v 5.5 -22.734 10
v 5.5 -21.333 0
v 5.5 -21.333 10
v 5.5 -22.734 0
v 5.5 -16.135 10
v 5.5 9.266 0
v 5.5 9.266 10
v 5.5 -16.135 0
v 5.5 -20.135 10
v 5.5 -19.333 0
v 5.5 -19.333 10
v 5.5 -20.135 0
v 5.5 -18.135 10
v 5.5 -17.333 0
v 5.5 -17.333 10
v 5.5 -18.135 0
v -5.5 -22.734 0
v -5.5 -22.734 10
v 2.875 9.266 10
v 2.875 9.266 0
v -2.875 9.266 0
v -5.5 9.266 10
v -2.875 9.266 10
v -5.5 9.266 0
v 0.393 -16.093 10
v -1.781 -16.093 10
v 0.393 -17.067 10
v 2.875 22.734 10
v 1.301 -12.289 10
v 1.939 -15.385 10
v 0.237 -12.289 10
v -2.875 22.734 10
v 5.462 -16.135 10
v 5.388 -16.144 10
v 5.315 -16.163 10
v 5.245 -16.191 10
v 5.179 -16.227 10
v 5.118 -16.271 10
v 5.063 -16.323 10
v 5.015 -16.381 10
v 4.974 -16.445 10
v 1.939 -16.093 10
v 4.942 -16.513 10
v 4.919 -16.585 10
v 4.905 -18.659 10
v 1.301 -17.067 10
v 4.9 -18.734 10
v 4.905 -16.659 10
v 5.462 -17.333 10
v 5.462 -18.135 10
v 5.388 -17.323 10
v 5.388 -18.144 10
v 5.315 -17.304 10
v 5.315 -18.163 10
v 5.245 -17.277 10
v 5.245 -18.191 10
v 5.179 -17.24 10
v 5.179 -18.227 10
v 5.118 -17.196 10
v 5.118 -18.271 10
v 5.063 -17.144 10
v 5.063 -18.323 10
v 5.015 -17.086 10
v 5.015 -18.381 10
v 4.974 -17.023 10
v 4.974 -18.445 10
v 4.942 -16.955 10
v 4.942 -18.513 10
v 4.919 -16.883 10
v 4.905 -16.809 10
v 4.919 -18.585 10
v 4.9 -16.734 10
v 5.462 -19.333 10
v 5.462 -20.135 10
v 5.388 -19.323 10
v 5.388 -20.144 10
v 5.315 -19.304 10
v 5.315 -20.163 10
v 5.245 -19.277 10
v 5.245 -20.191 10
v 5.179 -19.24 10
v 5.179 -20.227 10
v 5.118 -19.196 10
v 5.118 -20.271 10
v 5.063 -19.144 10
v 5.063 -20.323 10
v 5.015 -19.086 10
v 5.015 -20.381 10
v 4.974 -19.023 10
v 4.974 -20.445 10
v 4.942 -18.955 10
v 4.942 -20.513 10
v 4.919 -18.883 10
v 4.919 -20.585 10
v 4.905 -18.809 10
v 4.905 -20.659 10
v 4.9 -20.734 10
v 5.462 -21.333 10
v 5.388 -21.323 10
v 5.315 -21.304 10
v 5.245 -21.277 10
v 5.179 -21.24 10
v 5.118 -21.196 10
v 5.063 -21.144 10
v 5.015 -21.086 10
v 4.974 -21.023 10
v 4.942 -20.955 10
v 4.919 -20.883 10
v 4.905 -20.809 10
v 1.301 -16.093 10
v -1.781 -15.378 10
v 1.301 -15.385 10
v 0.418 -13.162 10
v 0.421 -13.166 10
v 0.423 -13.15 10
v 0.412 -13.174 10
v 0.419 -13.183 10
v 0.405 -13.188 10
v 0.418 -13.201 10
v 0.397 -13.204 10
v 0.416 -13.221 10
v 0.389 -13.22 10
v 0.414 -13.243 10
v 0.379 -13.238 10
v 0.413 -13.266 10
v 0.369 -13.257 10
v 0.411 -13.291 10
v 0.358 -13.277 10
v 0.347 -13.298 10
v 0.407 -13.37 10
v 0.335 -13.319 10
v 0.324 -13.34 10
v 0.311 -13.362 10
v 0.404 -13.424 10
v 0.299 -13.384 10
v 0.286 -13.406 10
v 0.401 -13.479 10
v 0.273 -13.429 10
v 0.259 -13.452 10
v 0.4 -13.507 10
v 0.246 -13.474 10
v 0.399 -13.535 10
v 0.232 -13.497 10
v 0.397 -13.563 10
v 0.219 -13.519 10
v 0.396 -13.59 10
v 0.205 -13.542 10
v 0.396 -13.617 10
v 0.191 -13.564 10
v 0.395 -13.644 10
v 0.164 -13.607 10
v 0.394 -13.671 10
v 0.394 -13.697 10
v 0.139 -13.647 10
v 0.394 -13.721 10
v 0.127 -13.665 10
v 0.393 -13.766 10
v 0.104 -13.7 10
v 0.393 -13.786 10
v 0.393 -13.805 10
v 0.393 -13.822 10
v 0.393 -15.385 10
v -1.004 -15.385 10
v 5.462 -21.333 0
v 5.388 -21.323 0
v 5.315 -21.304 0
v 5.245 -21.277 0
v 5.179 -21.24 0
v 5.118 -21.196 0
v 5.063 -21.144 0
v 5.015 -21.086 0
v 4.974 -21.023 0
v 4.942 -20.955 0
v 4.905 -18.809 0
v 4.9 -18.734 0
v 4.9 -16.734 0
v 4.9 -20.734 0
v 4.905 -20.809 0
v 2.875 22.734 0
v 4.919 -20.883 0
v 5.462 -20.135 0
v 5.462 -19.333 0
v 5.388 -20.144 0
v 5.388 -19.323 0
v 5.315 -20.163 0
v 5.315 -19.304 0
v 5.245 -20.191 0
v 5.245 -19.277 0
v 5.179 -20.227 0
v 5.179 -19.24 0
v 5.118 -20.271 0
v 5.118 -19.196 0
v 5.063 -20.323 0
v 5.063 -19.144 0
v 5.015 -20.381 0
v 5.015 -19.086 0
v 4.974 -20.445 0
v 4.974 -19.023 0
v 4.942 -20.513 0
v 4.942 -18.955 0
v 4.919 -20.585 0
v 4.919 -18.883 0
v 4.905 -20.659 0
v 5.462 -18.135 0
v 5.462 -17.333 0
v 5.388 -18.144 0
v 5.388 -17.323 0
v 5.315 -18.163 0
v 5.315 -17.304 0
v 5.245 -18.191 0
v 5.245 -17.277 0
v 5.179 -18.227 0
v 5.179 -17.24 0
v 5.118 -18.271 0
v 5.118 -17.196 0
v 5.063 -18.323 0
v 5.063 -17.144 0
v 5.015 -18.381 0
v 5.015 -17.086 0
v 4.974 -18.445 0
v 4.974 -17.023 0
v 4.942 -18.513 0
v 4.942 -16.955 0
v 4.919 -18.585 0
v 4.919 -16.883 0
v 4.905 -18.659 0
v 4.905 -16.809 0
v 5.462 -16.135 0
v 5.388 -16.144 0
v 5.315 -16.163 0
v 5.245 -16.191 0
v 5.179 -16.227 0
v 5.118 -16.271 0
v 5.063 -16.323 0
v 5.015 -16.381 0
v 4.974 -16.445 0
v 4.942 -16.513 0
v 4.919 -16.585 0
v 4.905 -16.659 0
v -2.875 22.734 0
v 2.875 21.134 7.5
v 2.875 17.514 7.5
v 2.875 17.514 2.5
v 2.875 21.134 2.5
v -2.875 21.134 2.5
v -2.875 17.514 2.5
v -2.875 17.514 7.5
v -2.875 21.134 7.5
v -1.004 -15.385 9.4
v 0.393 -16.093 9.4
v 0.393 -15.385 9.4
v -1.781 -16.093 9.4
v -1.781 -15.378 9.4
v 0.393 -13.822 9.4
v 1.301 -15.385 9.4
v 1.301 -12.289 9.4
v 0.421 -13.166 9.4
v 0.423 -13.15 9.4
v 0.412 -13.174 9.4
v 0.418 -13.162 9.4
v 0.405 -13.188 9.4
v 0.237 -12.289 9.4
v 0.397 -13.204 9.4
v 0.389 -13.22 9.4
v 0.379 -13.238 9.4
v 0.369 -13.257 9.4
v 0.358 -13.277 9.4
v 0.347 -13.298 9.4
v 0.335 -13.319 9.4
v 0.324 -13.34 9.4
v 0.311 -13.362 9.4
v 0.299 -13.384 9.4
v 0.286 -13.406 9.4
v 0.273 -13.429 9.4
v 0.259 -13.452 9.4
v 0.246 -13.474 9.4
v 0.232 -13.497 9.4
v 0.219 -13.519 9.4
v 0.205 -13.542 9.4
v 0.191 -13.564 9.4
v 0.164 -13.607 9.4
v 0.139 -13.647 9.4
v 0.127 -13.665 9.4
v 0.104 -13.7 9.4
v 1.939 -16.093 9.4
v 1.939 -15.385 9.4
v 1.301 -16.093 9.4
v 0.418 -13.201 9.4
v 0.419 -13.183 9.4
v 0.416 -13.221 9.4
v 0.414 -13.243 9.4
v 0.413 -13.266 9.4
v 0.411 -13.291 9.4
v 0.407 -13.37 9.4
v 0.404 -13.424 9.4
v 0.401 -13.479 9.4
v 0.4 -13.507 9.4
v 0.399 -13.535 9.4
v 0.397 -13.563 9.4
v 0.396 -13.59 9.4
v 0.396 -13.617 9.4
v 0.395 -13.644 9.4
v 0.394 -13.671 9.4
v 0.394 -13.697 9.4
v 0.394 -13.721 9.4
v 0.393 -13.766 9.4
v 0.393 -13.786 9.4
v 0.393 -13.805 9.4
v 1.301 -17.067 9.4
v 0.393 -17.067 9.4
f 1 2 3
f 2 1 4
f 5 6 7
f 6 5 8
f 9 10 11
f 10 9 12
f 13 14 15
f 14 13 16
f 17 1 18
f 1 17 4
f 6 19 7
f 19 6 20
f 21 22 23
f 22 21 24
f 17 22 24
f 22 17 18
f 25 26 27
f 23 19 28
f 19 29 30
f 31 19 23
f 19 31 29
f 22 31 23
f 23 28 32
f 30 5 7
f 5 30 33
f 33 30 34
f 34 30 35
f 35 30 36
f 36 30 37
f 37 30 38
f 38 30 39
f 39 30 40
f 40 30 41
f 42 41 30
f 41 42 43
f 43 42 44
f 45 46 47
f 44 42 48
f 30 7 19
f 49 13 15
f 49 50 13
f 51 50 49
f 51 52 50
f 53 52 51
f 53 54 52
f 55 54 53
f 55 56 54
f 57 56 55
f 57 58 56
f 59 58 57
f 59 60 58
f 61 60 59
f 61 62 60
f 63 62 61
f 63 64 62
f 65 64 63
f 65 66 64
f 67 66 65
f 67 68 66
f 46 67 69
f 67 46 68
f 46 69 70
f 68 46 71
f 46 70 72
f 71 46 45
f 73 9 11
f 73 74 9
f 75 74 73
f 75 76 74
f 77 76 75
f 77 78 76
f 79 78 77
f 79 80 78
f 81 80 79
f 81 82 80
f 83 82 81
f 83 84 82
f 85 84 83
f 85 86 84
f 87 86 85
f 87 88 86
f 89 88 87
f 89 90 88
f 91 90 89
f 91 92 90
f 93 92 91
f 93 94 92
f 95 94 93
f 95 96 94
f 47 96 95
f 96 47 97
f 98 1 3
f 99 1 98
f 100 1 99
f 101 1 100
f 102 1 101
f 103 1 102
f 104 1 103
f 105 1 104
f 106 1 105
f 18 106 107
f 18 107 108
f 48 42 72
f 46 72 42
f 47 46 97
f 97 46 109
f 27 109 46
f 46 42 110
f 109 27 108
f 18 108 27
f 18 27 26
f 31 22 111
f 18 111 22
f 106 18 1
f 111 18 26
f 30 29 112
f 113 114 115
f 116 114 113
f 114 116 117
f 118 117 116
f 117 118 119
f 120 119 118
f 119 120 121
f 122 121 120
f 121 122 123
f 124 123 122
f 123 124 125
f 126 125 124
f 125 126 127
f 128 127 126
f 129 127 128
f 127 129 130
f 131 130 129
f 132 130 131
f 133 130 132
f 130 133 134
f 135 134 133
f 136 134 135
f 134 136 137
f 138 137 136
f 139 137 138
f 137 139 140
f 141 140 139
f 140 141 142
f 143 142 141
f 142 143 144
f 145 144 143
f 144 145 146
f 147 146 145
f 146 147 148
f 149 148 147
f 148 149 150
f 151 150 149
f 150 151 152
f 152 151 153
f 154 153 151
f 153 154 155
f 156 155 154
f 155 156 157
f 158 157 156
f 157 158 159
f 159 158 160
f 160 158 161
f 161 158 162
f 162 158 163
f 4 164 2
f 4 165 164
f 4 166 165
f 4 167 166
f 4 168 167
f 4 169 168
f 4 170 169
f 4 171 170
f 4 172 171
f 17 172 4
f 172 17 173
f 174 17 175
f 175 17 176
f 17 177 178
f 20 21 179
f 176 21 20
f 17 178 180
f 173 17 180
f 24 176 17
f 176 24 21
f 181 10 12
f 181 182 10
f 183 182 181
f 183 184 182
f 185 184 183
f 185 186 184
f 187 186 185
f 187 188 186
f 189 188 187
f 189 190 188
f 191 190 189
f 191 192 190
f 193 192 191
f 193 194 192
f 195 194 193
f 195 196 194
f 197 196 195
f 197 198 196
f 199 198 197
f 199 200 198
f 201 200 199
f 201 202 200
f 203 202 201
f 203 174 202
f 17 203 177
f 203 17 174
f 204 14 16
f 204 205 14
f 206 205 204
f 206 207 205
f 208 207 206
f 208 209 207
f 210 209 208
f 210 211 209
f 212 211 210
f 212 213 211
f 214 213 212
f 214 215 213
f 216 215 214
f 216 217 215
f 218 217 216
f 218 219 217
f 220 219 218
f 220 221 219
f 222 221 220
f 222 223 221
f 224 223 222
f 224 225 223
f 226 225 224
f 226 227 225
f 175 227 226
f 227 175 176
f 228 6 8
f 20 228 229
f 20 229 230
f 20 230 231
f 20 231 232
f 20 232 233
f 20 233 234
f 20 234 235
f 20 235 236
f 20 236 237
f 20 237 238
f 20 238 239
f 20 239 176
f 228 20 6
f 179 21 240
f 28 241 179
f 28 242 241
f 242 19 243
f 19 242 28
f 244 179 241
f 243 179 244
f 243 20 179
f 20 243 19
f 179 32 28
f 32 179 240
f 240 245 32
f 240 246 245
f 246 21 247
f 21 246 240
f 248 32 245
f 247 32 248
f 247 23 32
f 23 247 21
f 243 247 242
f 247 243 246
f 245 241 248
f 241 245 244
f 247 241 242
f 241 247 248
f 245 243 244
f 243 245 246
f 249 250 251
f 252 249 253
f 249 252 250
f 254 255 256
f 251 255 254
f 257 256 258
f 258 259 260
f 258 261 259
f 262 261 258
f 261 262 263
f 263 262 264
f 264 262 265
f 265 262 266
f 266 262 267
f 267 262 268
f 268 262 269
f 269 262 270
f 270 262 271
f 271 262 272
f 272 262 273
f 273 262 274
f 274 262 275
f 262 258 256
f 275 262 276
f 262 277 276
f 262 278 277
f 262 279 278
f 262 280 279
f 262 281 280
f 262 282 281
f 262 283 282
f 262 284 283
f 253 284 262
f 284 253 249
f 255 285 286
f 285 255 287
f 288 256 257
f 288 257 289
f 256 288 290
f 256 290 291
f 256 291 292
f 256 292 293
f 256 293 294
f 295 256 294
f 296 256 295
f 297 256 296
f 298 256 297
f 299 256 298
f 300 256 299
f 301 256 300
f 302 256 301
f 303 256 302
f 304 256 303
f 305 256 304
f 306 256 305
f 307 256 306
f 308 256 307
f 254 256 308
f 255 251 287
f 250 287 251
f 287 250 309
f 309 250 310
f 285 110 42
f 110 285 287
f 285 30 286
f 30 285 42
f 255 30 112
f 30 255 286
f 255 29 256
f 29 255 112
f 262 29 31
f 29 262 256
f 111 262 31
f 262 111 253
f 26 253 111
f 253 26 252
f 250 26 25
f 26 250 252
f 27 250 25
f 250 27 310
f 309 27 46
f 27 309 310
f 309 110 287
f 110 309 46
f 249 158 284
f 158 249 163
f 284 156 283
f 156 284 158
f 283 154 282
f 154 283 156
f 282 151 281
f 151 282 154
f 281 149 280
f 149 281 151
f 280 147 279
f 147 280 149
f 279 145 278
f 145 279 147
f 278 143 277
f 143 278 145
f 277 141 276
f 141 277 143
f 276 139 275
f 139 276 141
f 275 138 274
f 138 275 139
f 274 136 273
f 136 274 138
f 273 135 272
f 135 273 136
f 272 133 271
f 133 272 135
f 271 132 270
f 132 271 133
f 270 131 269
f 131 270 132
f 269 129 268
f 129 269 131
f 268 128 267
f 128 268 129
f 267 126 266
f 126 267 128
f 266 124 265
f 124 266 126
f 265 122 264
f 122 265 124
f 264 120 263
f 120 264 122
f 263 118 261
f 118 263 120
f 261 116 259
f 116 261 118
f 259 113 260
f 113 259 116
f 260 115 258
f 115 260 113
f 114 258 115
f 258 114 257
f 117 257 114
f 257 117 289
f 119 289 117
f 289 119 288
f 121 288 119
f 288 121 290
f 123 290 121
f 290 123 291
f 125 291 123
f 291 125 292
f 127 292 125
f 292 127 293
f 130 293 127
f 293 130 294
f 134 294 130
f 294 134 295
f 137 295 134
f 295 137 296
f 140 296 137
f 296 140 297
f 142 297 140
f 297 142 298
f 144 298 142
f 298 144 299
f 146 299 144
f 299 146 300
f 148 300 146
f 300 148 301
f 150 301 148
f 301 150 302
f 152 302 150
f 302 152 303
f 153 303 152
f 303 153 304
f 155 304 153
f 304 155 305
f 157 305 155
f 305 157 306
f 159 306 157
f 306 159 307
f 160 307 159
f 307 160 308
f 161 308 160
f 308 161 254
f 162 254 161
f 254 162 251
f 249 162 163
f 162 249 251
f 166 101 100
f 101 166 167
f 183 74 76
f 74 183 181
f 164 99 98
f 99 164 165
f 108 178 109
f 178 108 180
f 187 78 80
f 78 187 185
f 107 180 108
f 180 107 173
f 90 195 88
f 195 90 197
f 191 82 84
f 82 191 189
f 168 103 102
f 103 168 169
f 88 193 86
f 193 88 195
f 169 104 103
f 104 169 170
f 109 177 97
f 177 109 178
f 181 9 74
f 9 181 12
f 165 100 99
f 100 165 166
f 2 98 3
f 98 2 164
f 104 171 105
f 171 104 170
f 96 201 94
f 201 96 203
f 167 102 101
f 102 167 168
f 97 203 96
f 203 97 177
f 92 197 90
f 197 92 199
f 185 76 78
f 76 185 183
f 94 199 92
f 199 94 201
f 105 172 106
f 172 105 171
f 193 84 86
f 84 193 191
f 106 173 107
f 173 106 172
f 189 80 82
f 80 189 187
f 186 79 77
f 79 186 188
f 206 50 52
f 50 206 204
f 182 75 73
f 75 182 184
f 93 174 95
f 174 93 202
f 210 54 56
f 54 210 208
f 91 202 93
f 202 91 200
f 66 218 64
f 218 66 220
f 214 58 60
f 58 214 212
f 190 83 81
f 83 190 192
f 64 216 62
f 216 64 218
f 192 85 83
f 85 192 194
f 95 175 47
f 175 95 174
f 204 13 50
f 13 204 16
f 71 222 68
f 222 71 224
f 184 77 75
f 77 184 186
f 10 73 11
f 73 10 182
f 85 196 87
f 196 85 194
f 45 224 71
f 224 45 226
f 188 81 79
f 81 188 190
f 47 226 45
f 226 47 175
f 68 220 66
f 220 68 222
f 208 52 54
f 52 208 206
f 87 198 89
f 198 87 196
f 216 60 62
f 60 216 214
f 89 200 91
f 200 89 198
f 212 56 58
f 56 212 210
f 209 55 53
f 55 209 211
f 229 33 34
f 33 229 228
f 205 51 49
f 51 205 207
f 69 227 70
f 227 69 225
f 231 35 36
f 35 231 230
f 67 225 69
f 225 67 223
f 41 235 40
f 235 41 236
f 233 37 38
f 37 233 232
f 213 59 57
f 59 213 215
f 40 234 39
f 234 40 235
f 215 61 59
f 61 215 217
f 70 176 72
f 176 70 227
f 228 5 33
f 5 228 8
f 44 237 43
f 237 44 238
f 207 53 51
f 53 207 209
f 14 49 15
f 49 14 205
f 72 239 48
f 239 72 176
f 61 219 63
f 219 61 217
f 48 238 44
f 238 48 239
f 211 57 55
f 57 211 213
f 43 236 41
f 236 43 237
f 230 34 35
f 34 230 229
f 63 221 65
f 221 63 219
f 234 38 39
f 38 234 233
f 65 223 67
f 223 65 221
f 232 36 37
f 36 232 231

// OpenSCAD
$fn = 50;

difference() {
	union() {
		translate(v = [0, 9.266250000000001, 0]) {
			rotate(a = [90, 0, 0]) {
				difference() {
					union() {
						translate(v = [-5.5, 0, 0]) {
							cube(size = [11.0, 10.0, 32.0]);
						}
						translate(v = [-2.875, 0, -13.467499999999998]) {
							cube(size = [5.75, 10.0, 13.567499999999997]);
						}
					}
					union() {
						translate(v = [-2.975, 2.5, -11.867499999999998]) {
							cube(size = [5.95, 5.0, 3.62]);
						}
						translate(v = [0, 9.4, 24.0]) {
							rotate(a = [-90, 0, 0]) {
								linear_extrude(height = 0.7) {
									text(font = "Arial:style=Bold", halign = "center", size = 5.0, text = "4", valign = "center");
								}
							}
						}
						translate(v = [5.5, 10.1, 30.0]) {
							rotate(a = [90, 0, 0]) {
								cylinder(h = 10.2, r = 0.6);
							}
						}
						translate(v = [5.5, 10.1, 28.0]) {
							rotate(a = [90, 0, 0]) {
								cylinder(h = 10.2, r = 0.6);
							}
						}
						translate(v = [5.5, 10.1, 26.0]) {
							rotate(a = [90, 0, 0]) {
								cylinder(h = 10.2, r = 0.6);
							}
						}
					}
				}
			}
		}
	}
	union();
}
